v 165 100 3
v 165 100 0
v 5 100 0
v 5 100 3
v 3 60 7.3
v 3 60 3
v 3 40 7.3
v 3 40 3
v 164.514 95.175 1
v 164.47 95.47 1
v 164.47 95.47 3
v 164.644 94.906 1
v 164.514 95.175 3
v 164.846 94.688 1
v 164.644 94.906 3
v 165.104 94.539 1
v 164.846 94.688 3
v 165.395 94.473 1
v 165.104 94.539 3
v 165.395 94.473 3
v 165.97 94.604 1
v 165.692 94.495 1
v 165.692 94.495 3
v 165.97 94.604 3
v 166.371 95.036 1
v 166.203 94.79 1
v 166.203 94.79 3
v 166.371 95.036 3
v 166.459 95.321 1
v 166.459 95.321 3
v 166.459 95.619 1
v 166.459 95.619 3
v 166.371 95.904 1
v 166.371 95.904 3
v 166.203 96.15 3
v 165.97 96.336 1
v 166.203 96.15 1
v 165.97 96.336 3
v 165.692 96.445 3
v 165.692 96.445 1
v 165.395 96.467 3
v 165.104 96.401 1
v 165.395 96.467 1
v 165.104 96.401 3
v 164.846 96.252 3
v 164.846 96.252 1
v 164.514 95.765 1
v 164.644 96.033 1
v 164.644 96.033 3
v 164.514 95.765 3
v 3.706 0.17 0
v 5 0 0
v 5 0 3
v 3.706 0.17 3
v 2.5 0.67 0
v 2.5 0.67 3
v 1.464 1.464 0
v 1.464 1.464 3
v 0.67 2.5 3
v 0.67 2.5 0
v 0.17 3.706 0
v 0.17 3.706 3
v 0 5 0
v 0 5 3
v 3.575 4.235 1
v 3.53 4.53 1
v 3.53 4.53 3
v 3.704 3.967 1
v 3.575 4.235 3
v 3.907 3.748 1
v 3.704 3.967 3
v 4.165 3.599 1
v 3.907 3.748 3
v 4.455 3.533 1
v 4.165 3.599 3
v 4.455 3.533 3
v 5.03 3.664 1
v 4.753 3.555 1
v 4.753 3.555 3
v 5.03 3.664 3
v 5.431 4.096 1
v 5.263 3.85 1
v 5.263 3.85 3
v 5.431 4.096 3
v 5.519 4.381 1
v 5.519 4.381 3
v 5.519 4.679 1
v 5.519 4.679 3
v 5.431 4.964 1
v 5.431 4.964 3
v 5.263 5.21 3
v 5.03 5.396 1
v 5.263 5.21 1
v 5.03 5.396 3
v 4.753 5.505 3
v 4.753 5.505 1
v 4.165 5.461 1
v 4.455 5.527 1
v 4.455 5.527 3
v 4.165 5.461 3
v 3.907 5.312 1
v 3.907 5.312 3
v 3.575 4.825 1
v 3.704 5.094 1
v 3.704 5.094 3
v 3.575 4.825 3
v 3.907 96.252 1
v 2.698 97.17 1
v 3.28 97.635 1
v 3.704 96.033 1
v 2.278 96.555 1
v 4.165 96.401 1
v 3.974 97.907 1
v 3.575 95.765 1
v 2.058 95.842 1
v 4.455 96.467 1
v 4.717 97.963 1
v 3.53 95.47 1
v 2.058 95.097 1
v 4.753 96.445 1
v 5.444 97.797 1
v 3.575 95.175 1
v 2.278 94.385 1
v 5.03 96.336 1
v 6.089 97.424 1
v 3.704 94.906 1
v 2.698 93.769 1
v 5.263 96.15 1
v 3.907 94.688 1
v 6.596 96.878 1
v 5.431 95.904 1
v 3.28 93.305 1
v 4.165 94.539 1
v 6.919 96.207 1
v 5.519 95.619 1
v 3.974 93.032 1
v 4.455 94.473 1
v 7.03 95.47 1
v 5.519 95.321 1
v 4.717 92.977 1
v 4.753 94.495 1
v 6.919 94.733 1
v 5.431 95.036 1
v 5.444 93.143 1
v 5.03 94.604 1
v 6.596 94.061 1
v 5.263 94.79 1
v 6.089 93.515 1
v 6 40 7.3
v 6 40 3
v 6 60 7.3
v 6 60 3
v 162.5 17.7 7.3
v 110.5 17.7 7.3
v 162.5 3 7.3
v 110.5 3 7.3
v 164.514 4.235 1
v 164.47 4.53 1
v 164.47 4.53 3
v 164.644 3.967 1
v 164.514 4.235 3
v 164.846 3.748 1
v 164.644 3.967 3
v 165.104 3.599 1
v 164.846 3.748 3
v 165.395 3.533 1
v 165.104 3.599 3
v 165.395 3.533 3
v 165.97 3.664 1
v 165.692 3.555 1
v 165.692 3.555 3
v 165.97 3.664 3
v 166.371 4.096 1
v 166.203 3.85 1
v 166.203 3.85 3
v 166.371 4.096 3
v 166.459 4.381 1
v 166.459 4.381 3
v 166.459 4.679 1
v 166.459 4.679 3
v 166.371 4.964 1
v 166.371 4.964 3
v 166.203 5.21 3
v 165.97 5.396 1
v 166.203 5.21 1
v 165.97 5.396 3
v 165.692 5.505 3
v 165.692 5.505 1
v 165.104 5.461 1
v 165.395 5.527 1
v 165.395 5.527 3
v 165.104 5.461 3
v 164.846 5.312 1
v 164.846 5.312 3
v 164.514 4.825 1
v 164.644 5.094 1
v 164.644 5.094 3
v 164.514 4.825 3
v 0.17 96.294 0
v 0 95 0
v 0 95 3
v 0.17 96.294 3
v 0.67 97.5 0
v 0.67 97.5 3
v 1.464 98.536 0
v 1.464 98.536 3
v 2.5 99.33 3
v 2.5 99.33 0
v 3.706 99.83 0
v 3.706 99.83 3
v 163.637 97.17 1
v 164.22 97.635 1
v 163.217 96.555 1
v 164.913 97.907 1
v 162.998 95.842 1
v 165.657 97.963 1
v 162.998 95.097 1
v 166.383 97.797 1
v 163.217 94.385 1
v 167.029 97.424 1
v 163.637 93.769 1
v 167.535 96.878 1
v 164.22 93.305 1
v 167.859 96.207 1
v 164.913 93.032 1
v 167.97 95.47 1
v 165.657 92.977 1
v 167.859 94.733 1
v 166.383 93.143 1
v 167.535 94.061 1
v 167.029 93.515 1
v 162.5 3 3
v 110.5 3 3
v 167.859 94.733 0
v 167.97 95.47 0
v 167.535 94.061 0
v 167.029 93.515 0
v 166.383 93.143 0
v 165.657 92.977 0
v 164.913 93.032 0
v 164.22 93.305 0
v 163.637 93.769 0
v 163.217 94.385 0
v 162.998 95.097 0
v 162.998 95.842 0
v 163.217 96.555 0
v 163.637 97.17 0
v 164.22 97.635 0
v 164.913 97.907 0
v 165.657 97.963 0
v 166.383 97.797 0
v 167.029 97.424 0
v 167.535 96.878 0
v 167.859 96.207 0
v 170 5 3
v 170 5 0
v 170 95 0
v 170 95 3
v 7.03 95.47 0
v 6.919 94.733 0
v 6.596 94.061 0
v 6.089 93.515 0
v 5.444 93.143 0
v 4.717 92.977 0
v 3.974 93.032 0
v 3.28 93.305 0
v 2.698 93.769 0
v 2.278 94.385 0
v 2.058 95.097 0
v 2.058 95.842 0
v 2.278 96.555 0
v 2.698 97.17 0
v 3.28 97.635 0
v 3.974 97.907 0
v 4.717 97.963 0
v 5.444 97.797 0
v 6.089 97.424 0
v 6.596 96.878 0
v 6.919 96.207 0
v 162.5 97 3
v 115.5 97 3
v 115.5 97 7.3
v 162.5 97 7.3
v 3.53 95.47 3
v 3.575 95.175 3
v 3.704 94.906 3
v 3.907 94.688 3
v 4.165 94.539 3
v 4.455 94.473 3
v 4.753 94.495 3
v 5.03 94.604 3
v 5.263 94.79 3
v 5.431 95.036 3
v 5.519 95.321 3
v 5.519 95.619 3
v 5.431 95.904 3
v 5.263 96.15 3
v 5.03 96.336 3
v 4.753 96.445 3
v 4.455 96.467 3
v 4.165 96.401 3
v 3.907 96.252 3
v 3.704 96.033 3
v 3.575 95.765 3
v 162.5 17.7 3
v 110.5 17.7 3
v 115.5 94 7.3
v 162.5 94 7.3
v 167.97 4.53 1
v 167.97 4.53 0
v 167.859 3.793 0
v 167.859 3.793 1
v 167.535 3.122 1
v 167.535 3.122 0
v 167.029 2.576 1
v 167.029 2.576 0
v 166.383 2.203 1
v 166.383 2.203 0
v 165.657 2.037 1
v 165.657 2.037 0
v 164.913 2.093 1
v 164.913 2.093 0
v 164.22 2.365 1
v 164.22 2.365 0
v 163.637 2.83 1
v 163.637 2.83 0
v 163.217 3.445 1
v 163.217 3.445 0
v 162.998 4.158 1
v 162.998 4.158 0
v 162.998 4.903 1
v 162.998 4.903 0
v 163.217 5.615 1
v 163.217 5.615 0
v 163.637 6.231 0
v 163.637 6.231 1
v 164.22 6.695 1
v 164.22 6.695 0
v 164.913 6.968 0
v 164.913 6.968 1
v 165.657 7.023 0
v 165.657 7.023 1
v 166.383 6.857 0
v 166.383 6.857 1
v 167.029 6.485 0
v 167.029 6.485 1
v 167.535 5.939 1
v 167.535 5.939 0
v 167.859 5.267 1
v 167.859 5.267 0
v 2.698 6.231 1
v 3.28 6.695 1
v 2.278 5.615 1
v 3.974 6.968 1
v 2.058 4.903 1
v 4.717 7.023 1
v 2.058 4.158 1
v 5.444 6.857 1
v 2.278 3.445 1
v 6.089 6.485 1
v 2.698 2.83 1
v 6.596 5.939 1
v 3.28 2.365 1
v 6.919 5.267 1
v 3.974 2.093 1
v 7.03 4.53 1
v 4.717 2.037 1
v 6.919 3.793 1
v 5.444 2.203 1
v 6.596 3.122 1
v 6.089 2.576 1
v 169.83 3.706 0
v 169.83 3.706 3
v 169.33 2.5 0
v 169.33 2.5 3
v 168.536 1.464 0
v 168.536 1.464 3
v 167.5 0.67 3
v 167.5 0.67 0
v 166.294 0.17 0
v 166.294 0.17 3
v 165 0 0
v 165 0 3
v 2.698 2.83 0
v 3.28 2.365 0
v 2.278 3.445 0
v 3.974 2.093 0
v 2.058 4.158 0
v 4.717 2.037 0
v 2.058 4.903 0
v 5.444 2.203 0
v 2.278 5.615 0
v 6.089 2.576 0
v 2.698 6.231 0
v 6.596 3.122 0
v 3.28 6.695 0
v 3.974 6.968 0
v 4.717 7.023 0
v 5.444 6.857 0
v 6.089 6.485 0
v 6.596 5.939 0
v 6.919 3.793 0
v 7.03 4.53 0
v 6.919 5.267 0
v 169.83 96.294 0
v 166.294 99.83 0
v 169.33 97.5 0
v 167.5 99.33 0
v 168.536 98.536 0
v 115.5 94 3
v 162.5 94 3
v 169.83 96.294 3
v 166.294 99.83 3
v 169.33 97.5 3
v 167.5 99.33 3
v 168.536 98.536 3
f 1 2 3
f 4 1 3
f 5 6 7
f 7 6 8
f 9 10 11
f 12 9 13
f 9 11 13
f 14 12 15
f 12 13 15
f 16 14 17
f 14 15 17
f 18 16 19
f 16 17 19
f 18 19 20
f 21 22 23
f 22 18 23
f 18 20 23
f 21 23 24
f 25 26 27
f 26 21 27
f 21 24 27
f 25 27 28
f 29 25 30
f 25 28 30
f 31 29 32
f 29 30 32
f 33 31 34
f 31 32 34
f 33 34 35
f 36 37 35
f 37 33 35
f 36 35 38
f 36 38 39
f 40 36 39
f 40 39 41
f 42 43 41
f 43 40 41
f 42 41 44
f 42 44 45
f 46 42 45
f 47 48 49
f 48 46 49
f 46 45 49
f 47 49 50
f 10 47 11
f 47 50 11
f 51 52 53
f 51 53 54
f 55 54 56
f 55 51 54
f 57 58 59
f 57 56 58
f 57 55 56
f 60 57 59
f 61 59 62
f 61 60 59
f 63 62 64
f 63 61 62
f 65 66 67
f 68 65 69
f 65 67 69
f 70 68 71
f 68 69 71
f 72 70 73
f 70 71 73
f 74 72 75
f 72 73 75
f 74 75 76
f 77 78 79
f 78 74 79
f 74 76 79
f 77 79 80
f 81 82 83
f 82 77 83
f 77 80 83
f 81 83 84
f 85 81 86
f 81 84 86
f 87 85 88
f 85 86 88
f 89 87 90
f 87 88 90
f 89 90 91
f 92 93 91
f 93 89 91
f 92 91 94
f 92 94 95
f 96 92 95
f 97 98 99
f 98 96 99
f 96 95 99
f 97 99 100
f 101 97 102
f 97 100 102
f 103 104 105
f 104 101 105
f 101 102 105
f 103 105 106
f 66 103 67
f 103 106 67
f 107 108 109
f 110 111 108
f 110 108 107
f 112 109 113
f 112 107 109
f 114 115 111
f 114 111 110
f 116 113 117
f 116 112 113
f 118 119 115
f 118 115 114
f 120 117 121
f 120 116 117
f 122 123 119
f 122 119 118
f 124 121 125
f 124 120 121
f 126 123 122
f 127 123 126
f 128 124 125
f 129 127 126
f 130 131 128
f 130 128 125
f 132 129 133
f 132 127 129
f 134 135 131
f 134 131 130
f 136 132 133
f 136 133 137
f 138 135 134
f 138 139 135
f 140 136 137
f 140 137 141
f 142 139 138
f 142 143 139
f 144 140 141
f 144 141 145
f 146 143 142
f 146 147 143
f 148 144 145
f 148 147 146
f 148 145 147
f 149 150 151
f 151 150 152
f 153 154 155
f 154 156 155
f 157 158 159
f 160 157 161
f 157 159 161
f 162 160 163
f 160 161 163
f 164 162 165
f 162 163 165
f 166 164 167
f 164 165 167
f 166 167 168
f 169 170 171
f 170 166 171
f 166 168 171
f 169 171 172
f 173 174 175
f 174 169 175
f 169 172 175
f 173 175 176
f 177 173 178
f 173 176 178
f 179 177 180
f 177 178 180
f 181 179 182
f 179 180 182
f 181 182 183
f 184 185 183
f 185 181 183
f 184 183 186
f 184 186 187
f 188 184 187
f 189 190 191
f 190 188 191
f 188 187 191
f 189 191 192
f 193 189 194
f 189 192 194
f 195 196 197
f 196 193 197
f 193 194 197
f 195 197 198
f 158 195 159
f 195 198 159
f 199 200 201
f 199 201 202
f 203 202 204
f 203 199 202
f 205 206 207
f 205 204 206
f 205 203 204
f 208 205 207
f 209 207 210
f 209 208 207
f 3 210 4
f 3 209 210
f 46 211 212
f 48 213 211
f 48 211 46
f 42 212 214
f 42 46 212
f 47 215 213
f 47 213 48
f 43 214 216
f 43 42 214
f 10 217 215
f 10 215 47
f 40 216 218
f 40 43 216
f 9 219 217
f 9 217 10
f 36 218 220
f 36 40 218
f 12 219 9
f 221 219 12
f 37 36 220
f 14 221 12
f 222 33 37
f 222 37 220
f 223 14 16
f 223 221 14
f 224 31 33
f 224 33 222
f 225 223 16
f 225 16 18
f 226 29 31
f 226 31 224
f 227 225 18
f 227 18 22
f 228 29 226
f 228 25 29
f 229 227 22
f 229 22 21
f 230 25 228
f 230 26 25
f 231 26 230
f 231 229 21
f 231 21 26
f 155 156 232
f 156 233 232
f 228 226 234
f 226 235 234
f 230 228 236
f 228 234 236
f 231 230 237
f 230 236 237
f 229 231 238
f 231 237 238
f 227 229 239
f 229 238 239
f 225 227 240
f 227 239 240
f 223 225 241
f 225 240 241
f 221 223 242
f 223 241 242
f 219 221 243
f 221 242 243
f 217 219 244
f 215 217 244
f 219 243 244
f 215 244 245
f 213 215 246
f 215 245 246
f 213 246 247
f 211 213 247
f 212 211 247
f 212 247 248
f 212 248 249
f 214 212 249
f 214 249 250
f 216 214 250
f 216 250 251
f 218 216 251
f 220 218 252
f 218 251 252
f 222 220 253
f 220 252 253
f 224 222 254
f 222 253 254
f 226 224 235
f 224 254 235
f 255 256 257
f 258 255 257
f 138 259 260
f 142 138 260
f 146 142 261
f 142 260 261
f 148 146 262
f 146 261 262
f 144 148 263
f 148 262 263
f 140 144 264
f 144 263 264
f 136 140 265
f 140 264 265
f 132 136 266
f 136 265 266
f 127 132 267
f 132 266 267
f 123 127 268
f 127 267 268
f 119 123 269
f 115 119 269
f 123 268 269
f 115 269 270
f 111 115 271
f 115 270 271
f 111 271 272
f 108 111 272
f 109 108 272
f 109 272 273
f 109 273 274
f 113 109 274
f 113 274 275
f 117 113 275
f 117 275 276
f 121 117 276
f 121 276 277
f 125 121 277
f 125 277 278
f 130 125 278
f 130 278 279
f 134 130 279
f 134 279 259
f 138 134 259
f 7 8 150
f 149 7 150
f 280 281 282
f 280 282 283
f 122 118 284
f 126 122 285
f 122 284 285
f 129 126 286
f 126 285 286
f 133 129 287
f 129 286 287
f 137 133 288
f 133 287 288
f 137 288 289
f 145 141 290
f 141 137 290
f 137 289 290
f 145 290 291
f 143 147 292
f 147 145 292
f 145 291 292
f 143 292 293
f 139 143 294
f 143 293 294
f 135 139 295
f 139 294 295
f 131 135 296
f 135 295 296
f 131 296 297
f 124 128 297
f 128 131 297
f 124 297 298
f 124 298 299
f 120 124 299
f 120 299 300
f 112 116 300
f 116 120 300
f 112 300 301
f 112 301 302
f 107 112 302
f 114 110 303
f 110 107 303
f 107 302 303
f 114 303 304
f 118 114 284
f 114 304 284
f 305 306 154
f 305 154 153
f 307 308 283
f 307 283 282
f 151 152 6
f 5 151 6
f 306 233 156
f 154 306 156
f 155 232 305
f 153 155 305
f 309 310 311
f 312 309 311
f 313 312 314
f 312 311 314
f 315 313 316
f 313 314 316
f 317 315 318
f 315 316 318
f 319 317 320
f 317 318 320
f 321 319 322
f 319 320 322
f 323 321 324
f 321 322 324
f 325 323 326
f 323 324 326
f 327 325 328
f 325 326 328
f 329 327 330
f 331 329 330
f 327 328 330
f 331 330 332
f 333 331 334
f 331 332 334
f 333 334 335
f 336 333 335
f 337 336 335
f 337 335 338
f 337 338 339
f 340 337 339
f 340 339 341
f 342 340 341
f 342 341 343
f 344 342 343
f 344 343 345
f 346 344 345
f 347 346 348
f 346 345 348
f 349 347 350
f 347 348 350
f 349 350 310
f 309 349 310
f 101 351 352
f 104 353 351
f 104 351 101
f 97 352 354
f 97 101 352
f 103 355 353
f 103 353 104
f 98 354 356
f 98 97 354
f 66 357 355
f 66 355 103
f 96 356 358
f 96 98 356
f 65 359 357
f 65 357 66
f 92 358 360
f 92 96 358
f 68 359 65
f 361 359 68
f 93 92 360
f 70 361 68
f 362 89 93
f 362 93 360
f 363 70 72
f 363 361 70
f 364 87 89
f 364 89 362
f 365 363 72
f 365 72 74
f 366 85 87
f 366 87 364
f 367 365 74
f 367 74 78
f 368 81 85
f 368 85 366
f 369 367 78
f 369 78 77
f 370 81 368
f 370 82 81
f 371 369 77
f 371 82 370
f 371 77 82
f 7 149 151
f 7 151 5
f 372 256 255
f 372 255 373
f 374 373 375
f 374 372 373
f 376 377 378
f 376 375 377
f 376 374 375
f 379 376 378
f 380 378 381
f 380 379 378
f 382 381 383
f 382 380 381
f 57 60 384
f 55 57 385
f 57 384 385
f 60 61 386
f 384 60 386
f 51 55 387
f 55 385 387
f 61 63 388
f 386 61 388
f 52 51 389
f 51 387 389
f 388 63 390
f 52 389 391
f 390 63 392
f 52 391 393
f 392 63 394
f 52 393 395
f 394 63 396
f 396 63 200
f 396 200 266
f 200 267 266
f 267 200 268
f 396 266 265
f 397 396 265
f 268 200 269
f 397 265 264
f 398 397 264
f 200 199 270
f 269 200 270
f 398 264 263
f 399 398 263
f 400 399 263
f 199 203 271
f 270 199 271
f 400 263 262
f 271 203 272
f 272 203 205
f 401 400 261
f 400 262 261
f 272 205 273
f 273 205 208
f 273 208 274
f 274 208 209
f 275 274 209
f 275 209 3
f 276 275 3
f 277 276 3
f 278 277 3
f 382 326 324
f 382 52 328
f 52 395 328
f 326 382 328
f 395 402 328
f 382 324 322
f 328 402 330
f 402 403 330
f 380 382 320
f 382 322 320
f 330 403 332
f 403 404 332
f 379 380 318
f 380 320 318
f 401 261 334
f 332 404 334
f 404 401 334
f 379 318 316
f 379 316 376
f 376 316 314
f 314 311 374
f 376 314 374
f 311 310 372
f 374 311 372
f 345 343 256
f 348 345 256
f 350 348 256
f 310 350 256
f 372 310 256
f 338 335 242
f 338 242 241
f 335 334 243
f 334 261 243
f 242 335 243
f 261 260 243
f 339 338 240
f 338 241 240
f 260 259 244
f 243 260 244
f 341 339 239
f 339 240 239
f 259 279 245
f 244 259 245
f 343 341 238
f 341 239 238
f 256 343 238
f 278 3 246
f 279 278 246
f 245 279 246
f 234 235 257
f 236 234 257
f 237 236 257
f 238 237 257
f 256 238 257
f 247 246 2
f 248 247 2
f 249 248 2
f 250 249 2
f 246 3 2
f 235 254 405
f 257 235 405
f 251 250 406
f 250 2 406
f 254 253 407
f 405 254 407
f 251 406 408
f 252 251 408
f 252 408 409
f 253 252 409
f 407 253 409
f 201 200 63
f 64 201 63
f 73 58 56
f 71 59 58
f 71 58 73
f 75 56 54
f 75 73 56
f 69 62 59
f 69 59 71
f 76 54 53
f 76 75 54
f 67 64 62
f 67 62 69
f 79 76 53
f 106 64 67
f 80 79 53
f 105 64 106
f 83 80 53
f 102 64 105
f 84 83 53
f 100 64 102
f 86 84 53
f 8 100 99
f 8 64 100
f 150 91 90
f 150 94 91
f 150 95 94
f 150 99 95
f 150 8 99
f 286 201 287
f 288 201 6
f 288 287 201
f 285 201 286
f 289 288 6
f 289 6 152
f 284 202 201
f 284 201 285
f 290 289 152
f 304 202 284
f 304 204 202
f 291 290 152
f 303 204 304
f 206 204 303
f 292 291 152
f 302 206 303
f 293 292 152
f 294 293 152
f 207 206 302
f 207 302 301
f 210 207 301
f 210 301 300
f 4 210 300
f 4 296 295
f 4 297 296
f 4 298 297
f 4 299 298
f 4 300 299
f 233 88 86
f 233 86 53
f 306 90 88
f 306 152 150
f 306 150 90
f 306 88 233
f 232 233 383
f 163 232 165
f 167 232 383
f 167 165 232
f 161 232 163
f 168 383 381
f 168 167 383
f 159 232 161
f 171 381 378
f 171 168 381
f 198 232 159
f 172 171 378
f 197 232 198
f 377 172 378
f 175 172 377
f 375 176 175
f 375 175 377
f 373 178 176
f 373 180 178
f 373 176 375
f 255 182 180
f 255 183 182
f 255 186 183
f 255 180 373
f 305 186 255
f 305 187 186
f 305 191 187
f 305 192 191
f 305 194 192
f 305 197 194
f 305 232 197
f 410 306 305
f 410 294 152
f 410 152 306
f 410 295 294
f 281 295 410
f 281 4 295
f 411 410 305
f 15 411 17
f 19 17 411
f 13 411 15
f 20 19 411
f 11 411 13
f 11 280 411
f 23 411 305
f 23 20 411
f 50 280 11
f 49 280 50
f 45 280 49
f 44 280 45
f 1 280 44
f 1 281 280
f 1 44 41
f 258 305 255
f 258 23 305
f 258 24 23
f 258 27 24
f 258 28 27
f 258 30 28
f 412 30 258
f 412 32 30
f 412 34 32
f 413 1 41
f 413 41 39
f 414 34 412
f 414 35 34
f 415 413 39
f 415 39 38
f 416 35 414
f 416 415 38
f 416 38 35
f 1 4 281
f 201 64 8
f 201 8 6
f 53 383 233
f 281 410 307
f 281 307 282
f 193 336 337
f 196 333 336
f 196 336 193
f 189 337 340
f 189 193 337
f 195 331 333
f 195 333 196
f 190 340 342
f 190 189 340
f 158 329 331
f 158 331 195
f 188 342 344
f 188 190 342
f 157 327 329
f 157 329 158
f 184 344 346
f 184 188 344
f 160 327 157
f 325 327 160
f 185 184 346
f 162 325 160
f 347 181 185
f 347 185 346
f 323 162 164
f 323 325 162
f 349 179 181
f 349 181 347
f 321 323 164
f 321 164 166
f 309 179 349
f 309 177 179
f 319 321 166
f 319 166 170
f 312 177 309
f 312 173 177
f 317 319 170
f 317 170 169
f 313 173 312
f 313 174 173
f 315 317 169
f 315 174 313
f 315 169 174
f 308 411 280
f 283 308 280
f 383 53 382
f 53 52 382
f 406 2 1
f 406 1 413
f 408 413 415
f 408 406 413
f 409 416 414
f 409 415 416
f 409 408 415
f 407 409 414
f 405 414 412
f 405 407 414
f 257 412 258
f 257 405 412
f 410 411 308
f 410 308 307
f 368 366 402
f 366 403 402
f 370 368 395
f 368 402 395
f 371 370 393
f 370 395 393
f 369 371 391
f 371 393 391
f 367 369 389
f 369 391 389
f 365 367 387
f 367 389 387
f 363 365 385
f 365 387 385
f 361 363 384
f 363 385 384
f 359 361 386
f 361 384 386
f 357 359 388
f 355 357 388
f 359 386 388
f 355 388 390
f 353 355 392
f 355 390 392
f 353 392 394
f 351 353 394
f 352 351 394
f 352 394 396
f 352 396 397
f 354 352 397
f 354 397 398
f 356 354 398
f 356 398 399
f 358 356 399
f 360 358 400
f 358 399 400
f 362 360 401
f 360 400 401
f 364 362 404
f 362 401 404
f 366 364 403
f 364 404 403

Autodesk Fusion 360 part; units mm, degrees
sketch "Sketch1" plane through (0, 0, 0) normal (0, 0, 1) x (1, 0, 0)
  line L0 (5, 0) -> (165, 0)
  line L1 (170, 5) -> (170, 95)
  line L2 (165, 100) -> (5, 100)
  line L3 (0, 95) -> (0, 5)
  arc A0 (0, 5) -> (5, 0) centre (5, 5) ccw
  arc A1 (5, 100) -> (0, 95) centre (5, 95) ccw
  arc A2 (170, 95) -> (165, 100) centre (165, 95) ccw
  arc A3 (165, 0) -> (170, 5) centre (165, 5) ccw
  point P0 (170, 0)
  point P1 (0, 100)
  dimension "d1" = 170
  dimension "d2" = 100
  dimension "d3" = 5
  dimension "d4" = 5
  dimension "d5" = 5
  dimension "d6" = 5
extrude "Extrude1" add sketch "Sketch1" along normal blind 3
sketch "Sketch2" plane through (0, 0, 3) normal (0, 0, 1) x (-1, 0, 0)
  arc A0 (-165, 0) -> (-170, -5) centre (-165, -5) ccw
  line L0 (-170, -5) -> (-170, -95)
  arc A1 (-170, -95) -> (-165, -100) centre (-165, -95) ccw
  line L1 (-165, -100) -> (-5, -100)
  arc A2 (-5, -100) -> (0, -95) centre (-5, -95) ccw
  line L2 (0, -95) -> (0, -5)
  arc A3 (0, -5) -> (-5, 0) centre (-5, -5) ccw
  line L3 (-5, 0) -> (-165, 0)
  line L4 (-3, -95) -> (-3, -5)
  arc A4 (-3, -5) -> (-5, -3) centre (-5, -5) ccw
  line L5 (-5, -3) -> (-165, -3)
  arc A5 (-165, -3) -> (-167, -5) centre (-165, -5) ccw
  line L6 (-167, -5) -> (-167, -95)
  arc A6 (-167, -95) -> (-165, -97) centre (-165, -95) ccw
  arc A7 (-5, -97) -> (-3, -95) centre (-5, -95) ccw
  line L7 (-7.5, -92.5) -> (-7.5, -7.5)
  line L8 (-7.5, -7.5) -> (-110.5, -7.5)
  line L9 (-162.5, -7.5) -> (-162.5, -92.5)
  line L10 (-162.5, -92.5) -> (-7.5, -92.5)
  line L11 (-162.5, -92.5) -> (-162.5, -97)
  line L12 (-162.5, -92.5) -> (-98.5, -92.5)
  line L13 (-98.5, -92.5) -> (-98.5, -97)
  line L14 (-115.5, -97) -> (-162.5, -97)
  line L15 (-162.5, -97) -> (-162.5, -92.5)
  line L16 (-162.5, -7.5) -> (-162.5, -3)
  line L17 (-162.5, -3) -> (-110.5, -3)
  line L18 (-110.5, -3) -> (-110.5, -14.36)
  line L19 (-110.5, -14.36) -> (-162.5, -14.36)
  line L20 (-162.5, -14.36) -> (-162.5, -3)
  line L21 (-115.5, -97) -> (-162.5, -97)
  line L22 (-162.5, -97) -> (-162.5, -94)
  line L23 (-162.5, -94) -> (-115.5, -94)
  line L24 (-98.5, -94) -> (-98.5, -97)
  line L25 (-162.5, -94) -> (-115.5, -94)
  line L26 (-115.5, -94) -> (-115.5, -97)
  line L27 (-115.5, -97) -> (-162.5, -97)
  line L28 (-162.5, -97) -> (-162.5, -94)
  line L29 (-165, -97) -> (-115.5, -97)
  line L30 (-98.5, -97) -> (-5, -97)
  dimension "d11" = 64
  dimension "d12" = 52
  dimension "d13" = 11.36
  dimension "d14" = 3
  dimension "d15" = 47
extrude "Extrude2" add sketch "Sketch2" along normal blind 4.3 contours L5 L9 L16 L17 L18 L19 L20 | L11 L14 L15 L21 L22 L23 L25 L26 L27 L28 L29
sketch "Sketch3" plane through (0, 0, 3) normal (0, 0, 1) x (-1, 0, 0)
  line L0 (-162.5, -97) -> (-162.5, -94)
  line L1 (-162.5, -94) -> (-115.5, -94)
  line L2 (-115.5, -94) -> (-115.5, -97)
  line L3 (-115.5, -97) -> (-162.5, -97)
  line L4 (-162.5, -14.36) -> (-162.5, -3)
  line L5 (-162.5, -3) -> (-110.5, -3)
  line L6 (-110.5, -3) -> (-110.5, -14.36)
  line L7 (-110.5, -14.36) -> (-162.5, -14.36)
  arc A0 (-165, 0) -> (-170, -5) centre (-165, -5) ccw
  line L8 (-170, -5) -> (-170, -95)
  arc A1 (-170, -95) -> (-165, -100) centre (-165, -95) ccw
  line L9 (-165, -100) -> (-5, -100)
  arc A2 (-5, -100) -> (0, -95) centre (-5, -95) ccw
  line L10 (0, -95) -> (0, -5)
  arc A3 (0, -5) -> (-5, 0) centre (-5, -5) ccw
  line L11 (-5, 0) -> (-165, 0)
sketch "Sketch4" plane through (0, 0, 3) normal (0, 0, 1) x (1, 0, 0)
extrude "Extrude3" add 1 faces at (127.8333, 14.36, 4.4333) along direction (0, 1, 0) blind 3.34
sketch "Sketch5" plane through (0, 0, 3) normal (0, 0, 1) x (-1, 0, 0)
sketch "Sketch6" plane through (0, 0, 3) normal (0, 0, 1) x (-1, 0, 0)
  circle A0 centre (-4.5302, -4.5302) radius 1
  circle A1 centre (-4.5302, -95.4698) radius 1
  circle A2 centre (-165.4698, -95.4698) radius 1
  circle A3 centre (-165.4698, -4.5302) radius 1
  dimension "d26" = 2
  dimension "d30" = 2
  dimension "d34" = 2
  dimension "d38" = 2
extrude "Extrude4" cut sketch "Sketch6" against normal blind 3
sketch "Sketch7" plane through (0, 0, 0) normal (0, 0, -1) x (1, 0, 0)
  circle A0 centre (4.5302, -95.4698) radius 1
  circle A1 centre (165.4698, -95.4698) radius 1
  circle A2 centre (4.5302, -4.5302) radius 1
  circle A3 centre (165.4698, -4.5302) radius 1
  arc A4 (170, -5) -> (165, 0) centre (165, -5) ccw
  line L0 (165, 0) -> (5, 0)
  arc A5 (5, 0) -> (0, -5) centre (5, -5) ccw
  line L1 (0, -5) -> (0, -95)
  arc A6 (0, -95) -> (5, -100) centre (5, -95) ccw
  line L2 (5, -100) -> (165, -100)
  arc A7 (165, -100) -> (170, -95) centre (165, -95) ccw
  line L3 (170, -95) -> (170, -5)
  circle A8 centre (4.5302, -4.5302) radius 2.5
  circle A9 centre (4.5302, -95.4698) radius 2.5
  circle A10 centre (165.4698, -95.4698) radius 2.5
  circle A11 centre (165.4698, -4.5302) radius 2.5
  dimension "d41" = 1.5
  dimension "d42" = 1.5
  dimension "d43" = 1.5
  dimension "d44" = 1.5
extrude "Extrude5" cut sketch "Sketch7" against normal blind 1 contours A8 | A9 | A10 | A11
sketch "Sketch8" plane through (0, 0, 3) normal (0, 0, 1) x (1, 0, 0)
sketch "Sketch9" plane through (0, 0, 3) normal (0, 0, 1) x (-1, 0, 0)
  line L0 (-3, -40) -> (-6, -40)
  line L1 (-6, -40) -> (-6, -60)
  line L2 (-6, -60) -> (-3, -60)
  line L3 (-3, -60) -> (-3, -40)
  point P0 (-4.5, -50)
  dimension "d51" = 3
  dimension "d52" = 20
extrude "Extrude6" add sketch "Sketch9" along normal blind 4.3
